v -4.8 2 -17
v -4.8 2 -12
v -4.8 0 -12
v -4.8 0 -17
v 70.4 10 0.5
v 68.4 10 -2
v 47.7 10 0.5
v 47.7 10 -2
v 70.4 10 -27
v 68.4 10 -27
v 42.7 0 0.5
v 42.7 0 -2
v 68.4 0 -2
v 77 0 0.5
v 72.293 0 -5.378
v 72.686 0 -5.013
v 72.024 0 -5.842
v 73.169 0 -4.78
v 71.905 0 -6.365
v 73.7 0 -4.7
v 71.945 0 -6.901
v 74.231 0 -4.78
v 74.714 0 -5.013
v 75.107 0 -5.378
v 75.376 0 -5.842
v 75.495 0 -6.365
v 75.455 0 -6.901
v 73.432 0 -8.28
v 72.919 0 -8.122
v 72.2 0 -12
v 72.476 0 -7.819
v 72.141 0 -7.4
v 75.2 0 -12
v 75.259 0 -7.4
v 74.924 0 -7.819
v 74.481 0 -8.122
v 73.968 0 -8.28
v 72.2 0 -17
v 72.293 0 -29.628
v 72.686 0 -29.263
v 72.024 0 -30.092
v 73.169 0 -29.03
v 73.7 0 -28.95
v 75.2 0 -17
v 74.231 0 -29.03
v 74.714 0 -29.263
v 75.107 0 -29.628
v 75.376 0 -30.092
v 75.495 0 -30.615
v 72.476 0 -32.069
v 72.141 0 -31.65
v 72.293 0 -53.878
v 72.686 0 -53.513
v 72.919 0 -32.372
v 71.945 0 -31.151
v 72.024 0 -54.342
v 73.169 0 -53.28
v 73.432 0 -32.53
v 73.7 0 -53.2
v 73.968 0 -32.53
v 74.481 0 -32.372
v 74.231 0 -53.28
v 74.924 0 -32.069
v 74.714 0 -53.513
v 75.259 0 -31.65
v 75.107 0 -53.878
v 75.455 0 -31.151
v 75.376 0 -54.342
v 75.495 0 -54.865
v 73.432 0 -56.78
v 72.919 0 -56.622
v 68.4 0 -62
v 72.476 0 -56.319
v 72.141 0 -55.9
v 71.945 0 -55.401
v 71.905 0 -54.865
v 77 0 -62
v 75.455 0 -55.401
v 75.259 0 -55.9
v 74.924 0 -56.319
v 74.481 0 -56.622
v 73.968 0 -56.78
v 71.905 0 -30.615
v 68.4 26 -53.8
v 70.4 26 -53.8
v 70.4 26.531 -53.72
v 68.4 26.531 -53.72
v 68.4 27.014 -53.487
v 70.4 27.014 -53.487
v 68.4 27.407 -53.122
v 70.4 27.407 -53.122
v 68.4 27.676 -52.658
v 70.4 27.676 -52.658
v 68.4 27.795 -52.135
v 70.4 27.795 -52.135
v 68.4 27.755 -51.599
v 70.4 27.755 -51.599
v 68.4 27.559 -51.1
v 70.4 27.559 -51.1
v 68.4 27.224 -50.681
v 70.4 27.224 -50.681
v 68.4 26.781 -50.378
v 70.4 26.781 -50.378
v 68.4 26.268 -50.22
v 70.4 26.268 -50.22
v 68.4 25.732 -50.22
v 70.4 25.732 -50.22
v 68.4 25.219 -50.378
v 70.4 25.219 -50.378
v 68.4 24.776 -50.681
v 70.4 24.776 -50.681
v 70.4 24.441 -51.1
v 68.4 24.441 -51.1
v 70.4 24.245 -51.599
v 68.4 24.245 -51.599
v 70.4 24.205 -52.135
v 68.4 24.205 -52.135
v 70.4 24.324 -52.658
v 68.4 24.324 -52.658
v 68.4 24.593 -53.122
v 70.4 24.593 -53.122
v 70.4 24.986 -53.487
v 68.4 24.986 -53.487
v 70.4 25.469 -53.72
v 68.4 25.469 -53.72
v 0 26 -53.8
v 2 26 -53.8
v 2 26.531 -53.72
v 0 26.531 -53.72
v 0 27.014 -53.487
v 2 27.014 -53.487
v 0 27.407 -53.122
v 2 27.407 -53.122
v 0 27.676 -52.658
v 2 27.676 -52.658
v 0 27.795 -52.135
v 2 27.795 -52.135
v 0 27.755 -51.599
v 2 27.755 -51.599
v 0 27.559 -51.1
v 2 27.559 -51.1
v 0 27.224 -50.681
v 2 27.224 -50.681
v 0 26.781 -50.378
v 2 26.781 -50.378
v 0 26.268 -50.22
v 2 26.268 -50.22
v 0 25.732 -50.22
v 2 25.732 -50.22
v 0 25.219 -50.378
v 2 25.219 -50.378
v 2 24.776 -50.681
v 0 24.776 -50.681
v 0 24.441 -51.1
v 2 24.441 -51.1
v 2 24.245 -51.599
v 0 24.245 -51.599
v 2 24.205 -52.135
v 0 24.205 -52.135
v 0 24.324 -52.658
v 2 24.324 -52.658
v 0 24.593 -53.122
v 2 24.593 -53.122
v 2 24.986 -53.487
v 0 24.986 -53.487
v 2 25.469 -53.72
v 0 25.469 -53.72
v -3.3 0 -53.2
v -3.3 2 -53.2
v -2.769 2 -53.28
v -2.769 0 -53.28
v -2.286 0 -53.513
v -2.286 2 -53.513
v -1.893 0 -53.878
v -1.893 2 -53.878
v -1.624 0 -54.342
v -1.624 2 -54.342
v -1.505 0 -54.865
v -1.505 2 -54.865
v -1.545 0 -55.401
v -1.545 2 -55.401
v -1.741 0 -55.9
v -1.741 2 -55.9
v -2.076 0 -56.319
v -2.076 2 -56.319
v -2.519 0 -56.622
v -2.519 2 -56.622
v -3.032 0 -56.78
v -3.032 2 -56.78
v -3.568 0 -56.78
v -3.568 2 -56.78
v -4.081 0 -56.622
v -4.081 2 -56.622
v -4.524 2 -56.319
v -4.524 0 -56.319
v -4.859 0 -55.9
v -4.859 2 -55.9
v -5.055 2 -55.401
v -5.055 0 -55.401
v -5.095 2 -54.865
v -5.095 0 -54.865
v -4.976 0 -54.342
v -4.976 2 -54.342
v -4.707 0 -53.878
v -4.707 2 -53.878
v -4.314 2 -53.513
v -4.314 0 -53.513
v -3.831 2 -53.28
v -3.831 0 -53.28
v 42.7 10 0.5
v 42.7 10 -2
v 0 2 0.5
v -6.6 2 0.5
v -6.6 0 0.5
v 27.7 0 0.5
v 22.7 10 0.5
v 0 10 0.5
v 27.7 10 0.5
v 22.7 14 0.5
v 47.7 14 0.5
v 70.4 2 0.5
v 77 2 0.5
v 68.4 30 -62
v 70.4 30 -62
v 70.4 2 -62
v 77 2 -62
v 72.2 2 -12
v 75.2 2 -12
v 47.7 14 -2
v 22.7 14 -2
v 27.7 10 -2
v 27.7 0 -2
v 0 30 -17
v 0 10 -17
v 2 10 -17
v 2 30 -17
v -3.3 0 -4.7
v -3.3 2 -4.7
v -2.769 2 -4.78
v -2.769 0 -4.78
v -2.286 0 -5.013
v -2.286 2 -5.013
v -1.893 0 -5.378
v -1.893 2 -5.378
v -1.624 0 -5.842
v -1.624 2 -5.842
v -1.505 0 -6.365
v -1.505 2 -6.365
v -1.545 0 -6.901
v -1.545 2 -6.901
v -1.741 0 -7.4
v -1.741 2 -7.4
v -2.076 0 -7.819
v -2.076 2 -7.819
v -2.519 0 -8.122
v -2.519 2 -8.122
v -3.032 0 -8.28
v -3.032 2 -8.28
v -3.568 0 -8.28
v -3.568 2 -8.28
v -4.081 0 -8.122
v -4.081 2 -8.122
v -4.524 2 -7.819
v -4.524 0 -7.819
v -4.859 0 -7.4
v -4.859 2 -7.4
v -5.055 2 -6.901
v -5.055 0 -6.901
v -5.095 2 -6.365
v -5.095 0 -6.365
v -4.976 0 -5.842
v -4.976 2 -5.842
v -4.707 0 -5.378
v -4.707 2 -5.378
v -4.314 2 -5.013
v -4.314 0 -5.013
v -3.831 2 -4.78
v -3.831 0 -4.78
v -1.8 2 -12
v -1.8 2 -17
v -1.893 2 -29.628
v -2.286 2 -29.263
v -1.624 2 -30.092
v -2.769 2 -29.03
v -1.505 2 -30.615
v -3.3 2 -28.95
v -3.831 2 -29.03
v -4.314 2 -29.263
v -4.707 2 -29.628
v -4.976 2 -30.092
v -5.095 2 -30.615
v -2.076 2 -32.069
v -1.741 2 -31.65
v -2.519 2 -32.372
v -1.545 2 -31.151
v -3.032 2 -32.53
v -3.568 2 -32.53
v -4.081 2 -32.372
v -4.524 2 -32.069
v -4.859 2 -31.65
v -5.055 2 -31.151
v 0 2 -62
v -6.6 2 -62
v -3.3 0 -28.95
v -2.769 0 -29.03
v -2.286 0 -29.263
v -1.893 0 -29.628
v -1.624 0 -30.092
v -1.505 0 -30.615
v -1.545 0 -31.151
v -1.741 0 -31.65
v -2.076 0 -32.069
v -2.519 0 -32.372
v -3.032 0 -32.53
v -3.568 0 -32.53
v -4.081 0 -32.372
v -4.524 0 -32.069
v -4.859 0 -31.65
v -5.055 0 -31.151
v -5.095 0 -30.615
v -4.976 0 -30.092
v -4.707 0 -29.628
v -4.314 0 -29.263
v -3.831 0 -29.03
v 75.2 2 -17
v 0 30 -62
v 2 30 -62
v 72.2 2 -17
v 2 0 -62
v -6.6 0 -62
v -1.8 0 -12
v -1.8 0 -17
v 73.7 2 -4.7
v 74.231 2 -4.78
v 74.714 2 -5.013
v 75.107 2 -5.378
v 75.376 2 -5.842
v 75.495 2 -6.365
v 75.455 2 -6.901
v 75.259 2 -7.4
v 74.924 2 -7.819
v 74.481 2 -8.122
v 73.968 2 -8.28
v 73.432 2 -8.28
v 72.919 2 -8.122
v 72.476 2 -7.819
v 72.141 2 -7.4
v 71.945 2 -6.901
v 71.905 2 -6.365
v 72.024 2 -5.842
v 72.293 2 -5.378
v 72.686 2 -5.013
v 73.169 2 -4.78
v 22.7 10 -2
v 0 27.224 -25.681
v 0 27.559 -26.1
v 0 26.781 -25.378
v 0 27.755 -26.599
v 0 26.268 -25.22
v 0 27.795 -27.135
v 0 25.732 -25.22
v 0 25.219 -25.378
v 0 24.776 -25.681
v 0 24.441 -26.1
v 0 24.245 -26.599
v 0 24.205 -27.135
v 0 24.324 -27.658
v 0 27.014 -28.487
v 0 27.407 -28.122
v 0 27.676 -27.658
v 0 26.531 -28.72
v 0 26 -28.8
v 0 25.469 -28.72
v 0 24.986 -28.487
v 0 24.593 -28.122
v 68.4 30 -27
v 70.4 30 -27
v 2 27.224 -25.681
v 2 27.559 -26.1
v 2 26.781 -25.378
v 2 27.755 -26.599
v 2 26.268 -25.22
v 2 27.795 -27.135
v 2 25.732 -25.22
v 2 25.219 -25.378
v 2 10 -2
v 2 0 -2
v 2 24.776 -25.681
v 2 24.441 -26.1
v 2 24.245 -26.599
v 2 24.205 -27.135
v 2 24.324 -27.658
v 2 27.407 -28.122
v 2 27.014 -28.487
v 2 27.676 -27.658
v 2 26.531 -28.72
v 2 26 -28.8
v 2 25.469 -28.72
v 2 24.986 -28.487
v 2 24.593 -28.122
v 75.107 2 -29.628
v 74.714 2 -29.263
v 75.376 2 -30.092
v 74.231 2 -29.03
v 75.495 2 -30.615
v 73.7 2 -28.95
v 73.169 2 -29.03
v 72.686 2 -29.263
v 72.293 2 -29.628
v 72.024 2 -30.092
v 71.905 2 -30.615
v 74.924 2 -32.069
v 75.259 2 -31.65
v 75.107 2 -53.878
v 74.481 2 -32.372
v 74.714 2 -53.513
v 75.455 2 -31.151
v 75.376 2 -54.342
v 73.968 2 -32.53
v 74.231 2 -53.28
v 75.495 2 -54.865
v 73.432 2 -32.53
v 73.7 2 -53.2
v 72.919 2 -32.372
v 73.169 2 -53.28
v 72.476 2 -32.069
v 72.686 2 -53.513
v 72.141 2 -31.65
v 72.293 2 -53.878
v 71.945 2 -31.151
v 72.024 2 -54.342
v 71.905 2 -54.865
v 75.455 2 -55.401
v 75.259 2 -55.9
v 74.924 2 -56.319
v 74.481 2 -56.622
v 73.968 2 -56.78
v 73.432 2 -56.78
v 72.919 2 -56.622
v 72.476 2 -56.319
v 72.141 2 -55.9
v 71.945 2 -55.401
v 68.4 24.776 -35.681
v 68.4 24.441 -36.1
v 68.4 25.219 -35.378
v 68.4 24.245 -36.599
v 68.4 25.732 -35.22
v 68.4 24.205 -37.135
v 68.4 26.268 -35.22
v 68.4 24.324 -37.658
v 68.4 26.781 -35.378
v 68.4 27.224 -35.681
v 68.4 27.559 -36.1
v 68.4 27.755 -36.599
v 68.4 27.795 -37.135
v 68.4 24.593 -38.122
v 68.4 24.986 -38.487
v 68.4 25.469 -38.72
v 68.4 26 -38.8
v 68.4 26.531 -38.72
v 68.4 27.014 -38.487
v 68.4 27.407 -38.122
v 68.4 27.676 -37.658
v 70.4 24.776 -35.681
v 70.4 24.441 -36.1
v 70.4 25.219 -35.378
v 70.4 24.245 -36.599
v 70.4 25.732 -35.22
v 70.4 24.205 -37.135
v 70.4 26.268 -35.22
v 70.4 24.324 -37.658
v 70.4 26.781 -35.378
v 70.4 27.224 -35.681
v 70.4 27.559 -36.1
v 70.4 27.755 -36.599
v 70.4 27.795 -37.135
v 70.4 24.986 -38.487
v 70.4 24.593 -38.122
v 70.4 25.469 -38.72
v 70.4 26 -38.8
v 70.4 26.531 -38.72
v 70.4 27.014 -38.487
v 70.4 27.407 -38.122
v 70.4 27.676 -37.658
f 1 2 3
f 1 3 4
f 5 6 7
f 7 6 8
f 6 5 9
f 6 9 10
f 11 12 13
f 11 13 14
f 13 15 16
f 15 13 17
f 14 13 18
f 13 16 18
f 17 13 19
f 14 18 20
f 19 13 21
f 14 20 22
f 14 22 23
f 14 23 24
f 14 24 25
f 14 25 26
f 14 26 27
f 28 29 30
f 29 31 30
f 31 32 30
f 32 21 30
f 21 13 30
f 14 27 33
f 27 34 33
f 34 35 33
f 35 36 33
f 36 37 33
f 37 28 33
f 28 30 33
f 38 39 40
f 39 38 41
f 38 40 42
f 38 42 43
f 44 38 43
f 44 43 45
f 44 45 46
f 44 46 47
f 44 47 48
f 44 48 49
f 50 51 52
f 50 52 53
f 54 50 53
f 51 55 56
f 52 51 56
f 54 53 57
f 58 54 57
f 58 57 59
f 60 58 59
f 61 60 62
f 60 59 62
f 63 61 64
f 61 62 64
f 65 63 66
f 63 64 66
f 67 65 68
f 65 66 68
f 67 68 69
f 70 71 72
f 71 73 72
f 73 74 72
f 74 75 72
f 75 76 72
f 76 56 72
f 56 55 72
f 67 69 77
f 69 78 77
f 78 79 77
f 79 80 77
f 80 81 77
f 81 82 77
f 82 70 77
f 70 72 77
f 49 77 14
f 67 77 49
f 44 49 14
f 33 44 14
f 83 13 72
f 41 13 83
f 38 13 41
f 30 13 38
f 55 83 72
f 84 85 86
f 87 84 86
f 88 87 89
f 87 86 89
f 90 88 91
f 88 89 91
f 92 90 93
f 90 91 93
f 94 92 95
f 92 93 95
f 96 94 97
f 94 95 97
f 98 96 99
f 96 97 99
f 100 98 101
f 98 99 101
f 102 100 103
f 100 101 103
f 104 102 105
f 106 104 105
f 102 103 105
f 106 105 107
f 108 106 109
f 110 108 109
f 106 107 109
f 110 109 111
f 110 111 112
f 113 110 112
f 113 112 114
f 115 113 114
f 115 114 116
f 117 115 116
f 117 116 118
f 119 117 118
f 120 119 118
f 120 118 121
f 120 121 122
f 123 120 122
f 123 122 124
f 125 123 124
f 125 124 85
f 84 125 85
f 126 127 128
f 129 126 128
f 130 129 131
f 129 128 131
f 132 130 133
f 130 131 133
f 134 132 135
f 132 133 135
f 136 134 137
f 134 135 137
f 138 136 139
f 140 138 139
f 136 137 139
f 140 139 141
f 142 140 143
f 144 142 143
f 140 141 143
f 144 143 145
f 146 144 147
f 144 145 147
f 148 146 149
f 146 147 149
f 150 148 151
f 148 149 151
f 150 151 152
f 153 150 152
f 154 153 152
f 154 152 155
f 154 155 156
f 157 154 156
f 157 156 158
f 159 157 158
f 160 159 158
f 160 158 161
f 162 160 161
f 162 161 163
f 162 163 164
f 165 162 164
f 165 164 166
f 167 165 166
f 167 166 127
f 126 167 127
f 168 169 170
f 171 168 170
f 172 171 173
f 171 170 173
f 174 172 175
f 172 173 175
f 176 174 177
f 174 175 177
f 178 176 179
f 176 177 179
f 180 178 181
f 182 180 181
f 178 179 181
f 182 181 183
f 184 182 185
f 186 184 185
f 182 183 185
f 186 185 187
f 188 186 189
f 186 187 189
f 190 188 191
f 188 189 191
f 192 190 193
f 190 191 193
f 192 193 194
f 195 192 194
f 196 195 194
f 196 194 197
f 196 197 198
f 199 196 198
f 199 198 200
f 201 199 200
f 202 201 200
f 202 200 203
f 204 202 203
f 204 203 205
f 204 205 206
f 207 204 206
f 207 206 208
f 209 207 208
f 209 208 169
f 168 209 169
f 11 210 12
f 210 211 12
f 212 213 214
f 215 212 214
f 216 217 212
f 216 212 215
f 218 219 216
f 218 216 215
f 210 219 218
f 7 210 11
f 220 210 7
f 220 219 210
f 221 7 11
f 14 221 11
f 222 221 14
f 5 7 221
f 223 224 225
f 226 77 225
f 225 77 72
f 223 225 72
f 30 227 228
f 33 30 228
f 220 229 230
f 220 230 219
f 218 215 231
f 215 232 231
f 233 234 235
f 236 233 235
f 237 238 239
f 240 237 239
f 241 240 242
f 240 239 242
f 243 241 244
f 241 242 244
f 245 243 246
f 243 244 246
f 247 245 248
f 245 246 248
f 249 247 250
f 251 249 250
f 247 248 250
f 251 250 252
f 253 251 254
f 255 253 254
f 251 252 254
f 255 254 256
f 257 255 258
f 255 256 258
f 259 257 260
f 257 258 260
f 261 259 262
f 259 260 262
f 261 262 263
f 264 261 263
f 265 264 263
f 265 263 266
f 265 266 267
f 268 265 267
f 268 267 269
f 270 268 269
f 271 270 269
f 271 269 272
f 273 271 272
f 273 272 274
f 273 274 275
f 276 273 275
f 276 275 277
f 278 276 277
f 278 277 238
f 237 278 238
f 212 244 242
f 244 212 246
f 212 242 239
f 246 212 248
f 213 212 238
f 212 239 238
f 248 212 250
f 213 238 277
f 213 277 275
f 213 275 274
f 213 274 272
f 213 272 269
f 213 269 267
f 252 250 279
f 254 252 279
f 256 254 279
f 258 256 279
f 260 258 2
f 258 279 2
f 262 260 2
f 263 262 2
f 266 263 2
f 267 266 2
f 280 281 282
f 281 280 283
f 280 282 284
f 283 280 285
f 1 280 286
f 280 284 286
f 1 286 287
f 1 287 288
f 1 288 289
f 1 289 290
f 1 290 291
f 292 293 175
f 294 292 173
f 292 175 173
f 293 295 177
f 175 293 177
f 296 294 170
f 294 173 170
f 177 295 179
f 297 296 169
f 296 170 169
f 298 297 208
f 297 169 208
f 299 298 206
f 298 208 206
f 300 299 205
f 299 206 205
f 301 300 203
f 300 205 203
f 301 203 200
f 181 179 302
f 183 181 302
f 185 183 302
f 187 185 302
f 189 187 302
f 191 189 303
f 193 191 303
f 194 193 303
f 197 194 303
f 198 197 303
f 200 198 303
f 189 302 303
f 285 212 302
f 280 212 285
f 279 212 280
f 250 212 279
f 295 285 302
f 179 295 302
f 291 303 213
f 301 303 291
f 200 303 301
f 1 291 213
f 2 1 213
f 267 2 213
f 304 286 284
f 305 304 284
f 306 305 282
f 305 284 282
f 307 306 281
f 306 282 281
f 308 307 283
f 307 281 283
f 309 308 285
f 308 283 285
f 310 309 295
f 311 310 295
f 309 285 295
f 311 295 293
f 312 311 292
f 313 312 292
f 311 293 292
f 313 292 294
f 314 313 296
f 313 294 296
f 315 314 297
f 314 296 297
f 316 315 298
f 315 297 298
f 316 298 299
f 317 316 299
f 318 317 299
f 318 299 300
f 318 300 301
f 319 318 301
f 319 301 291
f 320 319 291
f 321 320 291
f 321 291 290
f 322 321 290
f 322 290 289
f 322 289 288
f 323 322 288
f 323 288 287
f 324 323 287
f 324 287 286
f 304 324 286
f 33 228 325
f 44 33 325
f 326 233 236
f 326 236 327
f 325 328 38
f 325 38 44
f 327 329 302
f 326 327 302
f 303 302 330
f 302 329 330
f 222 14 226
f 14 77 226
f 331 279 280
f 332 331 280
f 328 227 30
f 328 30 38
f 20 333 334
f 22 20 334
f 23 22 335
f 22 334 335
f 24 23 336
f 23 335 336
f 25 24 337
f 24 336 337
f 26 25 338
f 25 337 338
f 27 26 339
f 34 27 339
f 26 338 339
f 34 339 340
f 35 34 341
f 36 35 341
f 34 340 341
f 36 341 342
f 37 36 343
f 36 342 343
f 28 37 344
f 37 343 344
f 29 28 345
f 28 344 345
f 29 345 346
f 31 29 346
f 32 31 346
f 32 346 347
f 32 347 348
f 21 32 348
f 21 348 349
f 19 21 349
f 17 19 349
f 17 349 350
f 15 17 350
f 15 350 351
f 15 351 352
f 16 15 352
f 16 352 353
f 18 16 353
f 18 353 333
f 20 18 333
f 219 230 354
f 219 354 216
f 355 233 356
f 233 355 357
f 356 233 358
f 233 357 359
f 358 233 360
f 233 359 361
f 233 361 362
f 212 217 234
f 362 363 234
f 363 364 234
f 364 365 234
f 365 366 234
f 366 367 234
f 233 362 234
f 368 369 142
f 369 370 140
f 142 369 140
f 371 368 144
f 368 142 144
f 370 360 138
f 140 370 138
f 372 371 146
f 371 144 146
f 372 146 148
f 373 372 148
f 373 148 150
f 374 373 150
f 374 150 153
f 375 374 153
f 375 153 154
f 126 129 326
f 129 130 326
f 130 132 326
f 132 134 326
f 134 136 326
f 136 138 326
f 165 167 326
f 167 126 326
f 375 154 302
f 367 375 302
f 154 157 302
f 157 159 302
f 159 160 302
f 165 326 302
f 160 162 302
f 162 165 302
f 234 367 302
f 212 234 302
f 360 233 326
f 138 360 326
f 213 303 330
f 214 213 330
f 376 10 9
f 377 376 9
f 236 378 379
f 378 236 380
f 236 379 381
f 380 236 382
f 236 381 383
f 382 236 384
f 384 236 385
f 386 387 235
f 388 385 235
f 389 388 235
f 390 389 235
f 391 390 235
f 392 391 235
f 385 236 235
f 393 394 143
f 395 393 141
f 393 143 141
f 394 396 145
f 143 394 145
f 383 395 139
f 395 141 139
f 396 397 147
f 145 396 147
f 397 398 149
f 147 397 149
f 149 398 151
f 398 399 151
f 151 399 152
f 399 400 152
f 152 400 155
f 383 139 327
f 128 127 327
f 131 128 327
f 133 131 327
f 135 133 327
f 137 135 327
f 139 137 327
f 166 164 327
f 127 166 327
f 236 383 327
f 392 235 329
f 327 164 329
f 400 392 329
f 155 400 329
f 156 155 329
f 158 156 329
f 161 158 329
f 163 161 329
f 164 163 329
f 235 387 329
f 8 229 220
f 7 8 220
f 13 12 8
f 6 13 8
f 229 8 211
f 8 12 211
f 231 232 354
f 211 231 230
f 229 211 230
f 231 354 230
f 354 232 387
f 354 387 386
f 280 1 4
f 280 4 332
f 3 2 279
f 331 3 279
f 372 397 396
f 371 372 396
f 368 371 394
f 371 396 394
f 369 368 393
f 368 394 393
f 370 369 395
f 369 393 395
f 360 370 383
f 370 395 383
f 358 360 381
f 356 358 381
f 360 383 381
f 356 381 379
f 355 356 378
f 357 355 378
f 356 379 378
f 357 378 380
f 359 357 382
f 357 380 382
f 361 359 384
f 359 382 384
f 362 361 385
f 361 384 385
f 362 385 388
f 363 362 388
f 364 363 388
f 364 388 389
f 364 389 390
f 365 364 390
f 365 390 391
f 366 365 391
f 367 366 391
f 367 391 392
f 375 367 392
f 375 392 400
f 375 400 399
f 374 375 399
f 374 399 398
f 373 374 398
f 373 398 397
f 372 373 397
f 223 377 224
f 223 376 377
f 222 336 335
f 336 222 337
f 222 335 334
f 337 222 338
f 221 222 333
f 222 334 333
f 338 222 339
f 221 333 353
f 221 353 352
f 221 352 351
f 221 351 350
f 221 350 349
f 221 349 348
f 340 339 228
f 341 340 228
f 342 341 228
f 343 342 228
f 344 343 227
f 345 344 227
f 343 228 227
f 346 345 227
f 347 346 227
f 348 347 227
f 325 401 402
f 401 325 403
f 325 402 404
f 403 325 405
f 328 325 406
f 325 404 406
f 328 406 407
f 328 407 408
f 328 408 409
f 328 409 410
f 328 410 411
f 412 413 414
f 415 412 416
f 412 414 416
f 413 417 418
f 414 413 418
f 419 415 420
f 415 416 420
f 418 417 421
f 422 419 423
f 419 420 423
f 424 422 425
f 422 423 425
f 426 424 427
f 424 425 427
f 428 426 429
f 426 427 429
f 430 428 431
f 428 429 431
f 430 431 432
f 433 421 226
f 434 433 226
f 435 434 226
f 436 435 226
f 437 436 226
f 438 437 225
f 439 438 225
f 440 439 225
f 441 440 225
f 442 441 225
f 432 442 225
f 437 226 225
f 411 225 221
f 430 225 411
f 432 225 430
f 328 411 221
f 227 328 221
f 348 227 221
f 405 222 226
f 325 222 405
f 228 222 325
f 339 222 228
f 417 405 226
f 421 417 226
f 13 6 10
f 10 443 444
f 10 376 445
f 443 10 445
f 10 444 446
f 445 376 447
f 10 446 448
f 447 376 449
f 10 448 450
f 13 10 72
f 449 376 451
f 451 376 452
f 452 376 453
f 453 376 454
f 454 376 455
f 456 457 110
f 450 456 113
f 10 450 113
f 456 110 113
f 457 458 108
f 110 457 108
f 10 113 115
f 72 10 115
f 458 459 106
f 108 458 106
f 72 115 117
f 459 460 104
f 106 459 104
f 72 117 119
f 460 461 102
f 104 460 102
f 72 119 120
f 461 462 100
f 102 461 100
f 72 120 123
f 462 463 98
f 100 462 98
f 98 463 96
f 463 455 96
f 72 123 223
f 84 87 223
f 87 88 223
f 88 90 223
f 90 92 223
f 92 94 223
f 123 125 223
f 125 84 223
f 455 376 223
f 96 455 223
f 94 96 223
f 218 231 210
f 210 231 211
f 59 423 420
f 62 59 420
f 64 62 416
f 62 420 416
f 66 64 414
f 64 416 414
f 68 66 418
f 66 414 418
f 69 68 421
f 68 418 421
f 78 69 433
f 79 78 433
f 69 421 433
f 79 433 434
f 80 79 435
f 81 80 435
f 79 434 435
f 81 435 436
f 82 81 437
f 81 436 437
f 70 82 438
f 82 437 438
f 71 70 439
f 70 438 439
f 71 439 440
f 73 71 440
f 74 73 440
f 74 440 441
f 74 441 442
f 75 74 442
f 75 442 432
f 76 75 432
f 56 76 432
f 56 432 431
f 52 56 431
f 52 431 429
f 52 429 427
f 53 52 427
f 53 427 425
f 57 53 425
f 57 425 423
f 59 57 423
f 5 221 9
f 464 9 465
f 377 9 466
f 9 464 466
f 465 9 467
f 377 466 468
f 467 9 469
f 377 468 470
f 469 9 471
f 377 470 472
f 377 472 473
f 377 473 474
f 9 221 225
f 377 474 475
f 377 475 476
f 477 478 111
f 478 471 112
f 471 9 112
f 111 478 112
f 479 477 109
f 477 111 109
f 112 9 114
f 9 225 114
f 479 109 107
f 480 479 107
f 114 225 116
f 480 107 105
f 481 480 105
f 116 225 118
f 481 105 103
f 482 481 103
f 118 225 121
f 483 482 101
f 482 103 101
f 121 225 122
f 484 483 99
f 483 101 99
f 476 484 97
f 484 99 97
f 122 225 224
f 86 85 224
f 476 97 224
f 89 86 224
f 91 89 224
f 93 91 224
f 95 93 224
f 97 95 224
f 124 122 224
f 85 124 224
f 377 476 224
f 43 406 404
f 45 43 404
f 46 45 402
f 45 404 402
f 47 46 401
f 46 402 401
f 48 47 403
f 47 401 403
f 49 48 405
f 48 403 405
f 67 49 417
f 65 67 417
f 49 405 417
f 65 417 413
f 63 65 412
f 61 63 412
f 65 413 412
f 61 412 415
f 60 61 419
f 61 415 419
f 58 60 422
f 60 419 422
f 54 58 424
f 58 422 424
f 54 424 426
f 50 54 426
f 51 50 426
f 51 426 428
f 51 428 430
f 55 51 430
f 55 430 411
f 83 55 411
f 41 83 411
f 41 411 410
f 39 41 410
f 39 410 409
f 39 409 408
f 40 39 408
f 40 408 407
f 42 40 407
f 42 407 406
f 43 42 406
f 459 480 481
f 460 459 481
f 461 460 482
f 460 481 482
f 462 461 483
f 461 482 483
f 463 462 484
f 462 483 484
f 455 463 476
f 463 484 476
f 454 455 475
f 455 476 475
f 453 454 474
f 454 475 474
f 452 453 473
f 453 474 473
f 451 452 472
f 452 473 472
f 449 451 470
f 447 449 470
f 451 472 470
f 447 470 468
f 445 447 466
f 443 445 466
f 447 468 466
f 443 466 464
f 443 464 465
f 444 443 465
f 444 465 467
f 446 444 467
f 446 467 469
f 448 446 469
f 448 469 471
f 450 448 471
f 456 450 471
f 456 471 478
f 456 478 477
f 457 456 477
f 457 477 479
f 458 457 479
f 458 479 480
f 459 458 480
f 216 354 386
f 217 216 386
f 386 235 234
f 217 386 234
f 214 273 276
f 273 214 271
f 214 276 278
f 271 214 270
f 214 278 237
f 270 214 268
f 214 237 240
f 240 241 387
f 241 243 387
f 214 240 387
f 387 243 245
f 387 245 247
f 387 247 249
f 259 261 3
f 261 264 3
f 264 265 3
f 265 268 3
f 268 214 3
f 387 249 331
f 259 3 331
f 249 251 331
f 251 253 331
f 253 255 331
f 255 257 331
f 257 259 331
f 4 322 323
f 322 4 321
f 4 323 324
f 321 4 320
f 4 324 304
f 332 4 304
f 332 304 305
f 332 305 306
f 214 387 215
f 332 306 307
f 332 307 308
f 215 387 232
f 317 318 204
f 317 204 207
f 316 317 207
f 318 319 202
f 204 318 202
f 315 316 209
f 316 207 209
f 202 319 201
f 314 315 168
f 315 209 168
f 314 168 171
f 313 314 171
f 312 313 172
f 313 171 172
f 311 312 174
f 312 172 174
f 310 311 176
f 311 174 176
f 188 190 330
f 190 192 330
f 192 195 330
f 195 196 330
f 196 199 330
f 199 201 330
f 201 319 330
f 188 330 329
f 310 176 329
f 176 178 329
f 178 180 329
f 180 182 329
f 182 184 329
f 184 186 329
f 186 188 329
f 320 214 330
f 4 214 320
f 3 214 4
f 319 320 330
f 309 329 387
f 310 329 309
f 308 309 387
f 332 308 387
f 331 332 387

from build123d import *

# Parameters (mm, degrees)
SKETCH1_W                 = 70.4
SKETCH1_H                 = 2
BOSS_EXTRUDE2_DEPTH       = 10
SKETCH2_W                 = 2
SKETCH2_H                 = 55
BOSS_EXTRUDE3_DEPTH       = 10
SKETCH3_W                 = 19
SKETCH3_H                 = 3
BOSS_EXTRUDE4_DEPTH       = 2
SKETCH4_W                 = 15
SKETCH4_H                 = 10
CUT_EXTRUDE2_DEPTH        = 2
SKETCH5_W                 = 2
SKETCH5_H                 = 3
BOSS_EXTRUDE5_DEPTH       = 1
SKETCH6_W                 = 2
SKETCH6_H                 = 3
BOSS_EXTRUDE6_DEPTH       = 1
SKETCH7_W                 = 57
SKETCH7_H                 = 2
BOSS_EXTRUDE7_DEPTH       = 6.6
SKETCH8_W                 = 57
SKETCH8_H                 = 2
BOSS_EXTRUDE8_DEPTH       = 6.6
BOSS_EXTRUDE9_DEPTH       = 5
SKETCH12_W                = 2
SKETCH12_H                = 5
SKETCH12_H_2              = 40
SKETCH12_H_3              = 30
BOSS_EXTRUDE10_DEPTH      = 20
BOSS_EXTRUDE11_DEPTH      = 3
SKETCH14_W                = 0.5
SKETCH14_H                = 9
CUT_EXTRUDE3_DEPTH        = 3
SKETCH15_W                = 38.4
SKETCH15_H                = 45
CUT_EXTRUDE4_DEPTH        = 3
BOSS_EXTRUDE12_DEPTH      = 0.5
SKETCH17_R                = 1.8
SKETCH17_W                = 3
SKETCH17_H                = 5
CUT_EXTRUDE6_DEPTH        = 3
CUT_EXTRUDE7_DEPTH        = 116
CUT_EXTRUDE7_DEPTH_BACK   = 44
SKETCH18_W                = 45
SKETCH18_H                = 3
SKETCH19_R                = 1.8
CUT_EXTRUDE8_DEPTH        = 10
SKETCH20_R                = 1.8
CUT_EXTRUDE9_DEPTH        = 10
BOSS_EXTRUDE15_DEPTH      = 2
BOSS_EXTRUDE15_DEPTH_BACK = 23
SKETCH25_W                = 2.5
SKETCH25_H                = 4


with BuildPart() as part:
    # Sketch1 → Boss-Extrude2 (new body)
    with BuildSketch(Plane(origin=(0, 0, 0), x_dir=(1, 0, 0), z_dir=(0, 1, 0))):
        with Locations((35.2, 1)):
            Rectangle(SKETCH1_W, SKETCH1_H)
    extrude(amount=BOSS_EXTRUDE2_DEPTH)

    # Sketch2 → Boss-Extrude3 (add)
    with BuildSketch(Plane(origin=(0, 10, 0), x_dir=(1, 0, 0), z_dir=(0, 1, 0))):
        with Locations((1, 29.5)):
            Rectangle(SKETCH2_W, SKETCH2_H)
        with Locations((69.4, 29.5)):
            Rectangle(SKETCH2_W, SKETCH2_H)
    extrude(amount=-BOSS_EXTRUDE3_DEPTH)

    # Sketch3 → Boss-Extrude4 (add)
    with BuildSketch(Plane.XY):
        with Locations((35.2, 11.5)):
            Rectangle(SKETCH3_W, SKETCH3_H)
    extrude(amount=-BOSS_EXTRUDE4_DEPTH)

    # Sketch4 → Cut-Extrude2 (cut)
    with BuildSketch(Plane.XY):
        with Locations((35.2, 5)):
            Rectangle(SKETCH4_W, SKETCH4_H)
    extrude(amount=-CUT_EXTRUDE2_DEPTH, mode=Mode.SUBTRACT)

    # Sketch5 → Boss-Extrude5 (add)
    with BuildSketch(Plane.ZY.offset(-25.7)):
        with Locations((-1, 11.5)):
            Rectangle(SKETCH5_W, SKETCH5_H)
    extrude(amount=BOSS_EXTRUDE5_DEPTH)

    # Sketch6 → Boss-Extrude6 (add)
    with BuildSketch(Plane(origin=(44.7, 0, 0), x_dir=(0, 0, -1), z_dir=(1, 0, 0))):
        with Locations((1, 11.5)):
            Rectangle(SKETCH6_W, SKETCH6_H)
    extrude(amount=BOSS_EXTRUDE6_DEPTH)

    # Sketch7 → Boss-Extrude7 (add)
    with BuildSketch(Plane.ZY):
        with Locations((-28.5, 1)):
            Rectangle(SKETCH7_W, SKETCH7_H)
    extrude(amount=BOSS_EXTRUDE7_DEPTH)

    # Sketch8 → Boss-Extrude8 (add)
    with BuildSketch(Plane(origin=(70.4, 0, 0), x_dir=(0, 0, -1), z_dir=(1, 0, 0))):
        with Locations((28.5, 1)):
            Rectangle(SKETCH8_W, SKETCH8_H)
    extrude(amount=BOSS_EXTRUDE8_DEPTH)

    # Sketch10 → Boss-Extrude9 (add)
    with BuildSketch(Plane(origin=(0, 0, -57), x_dir=(-1, 0, 0), z_dir=(0, 0, -1))):
        Polygon((-2, 10), (-2, 0), (6.6, 0), (6.6, 2), (0, 2), (0, 10), align=None)
        Polygon((-77, 0), (-68.4, 0), (-68.4, 10), (-70.4, 10), (-70.4, 2), (-77, 2), align=None)
    extrude(amount=BOSS_EXTRUDE9_DEPTH)

    # Sketch12 → Boss-Extrude10 (add)
    with BuildSketch(Plane(origin=(0, 10, 0), x_dir=(1, 0, 0), z_dir=(0, 1, 0))):
        with Locations((1, 59.5)):
            Rectangle(SKETCH12_W, SKETCH12_H)
        with Locations((1, 37)):
            Rectangle(SKETCH12_W, SKETCH12_H_2)
        with Locations((69.4, 42)):
            Rectangle(SKETCH12_W, SKETCH12_H_3)
        with Locations((69.4, 59.5)):
            Rectangle(SKETCH12_W, SKETCH12_H)
    extrude(amount=BOSS_EXTRUDE10_DEPTH)

    # Sketch13 → Boss-Extrude11 (add)
    with BuildSketch(Plane(origin=(0, 30, 0), x_dir=(1, 0, 0), z_dir=(0, 1, 0))):
        Polygon((0, 17), (35.2, 17), (35.2, 27), (70.4, 27), (70.4, 62), (0, 62), align=None)
    extrude(amount=BOSS_EXTRUDE11_DEPTH)

    # Sketch14 → Cut-Extrude3 (cut)
    with BuildSketch(Plane(origin=(0, 33, 0), x_dir=(1, 0, 0), z_dir=(0, 1, 0))):
        with Locations((11.7, 51)):
            Rectangle(SKETCH14_W, SKETCH14_H)
        with Locations((11.7, 38)):
            Rectangle(SKETCH14_W, SKETCH14_H)
        with Locations((11.7, 25.5)):
            Rectangle(SKETCH14_W, SKETCH14_H)
        with Locations((58.2, 51)):
            Rectangle(SKETCH14_W, SKETCH14_H)
        with Locations((58.2, 38)):
            Rectangle(SKETCH14_W, SKETCH14_H)
    extrude(amount=-CUT_EXTRUDE3_DEPTH, mode=Mode.SUBTRACT)

    # Sketch15 → Cut-Extrude4 (cut)
    with BuildSketch(Plane(origin=(0, 33, 0), x_dir=(1, 0, 0), z_dir=(0, 1, 0))):
        with Locations((35.2, 39.5)):
            Rectangle(SKETCH15_W, SKETCH15_H)
    extrude(amount=-CUT_EXTRUDE4_DEPTH, mode=Mode.SUBTRACT)

    # Sketch16 → Boss-Extrude12 (add)
    with BuildSketch(Plane.XY):
        Polygon((-6.6, 0), (27.7, 0), (27.7, 10), (42.7, 10), (42.7, 0), (77, 0), (77, 2), (70.4, 2), (70.4, 10), (45.7, 10), (45.7, 13), (24.7, 13), (24.7, 10), (0, 10), (0, 2), (-6.6, 2), align=None)
    extrude(amount=BOSS_EXTRUDE12_DEPTH)

    # Sketch17 → Cut-Extrude6 (cut)
    with BuildSketch(Plane(origin=(0, 2, 0), x_dir=(1, 0, 0), z_dir=(0, 1, 0))):
        with Locations(Location((-3.3, 55, 0), (0, 0, 270))):
            Circle(SKETCH17_R)
        with Locations(Location((73.7, 55, 0), (0, 0, 270))):
            Circle(SKETCH17_R)
        with Locations(Location((-3.3, 6.5, 0), (0, 0, 270))):
            Circle(SKETCH17_R)
        with Locations(Location((73.7, 6.5, 0), (0, 0, 270))):
            Circle(SKETCH17_R)
        with Locations(Location((-3.3, 30.75, 0), (0, 0, 270))):
            Circle(SKETCH17_R)
        with Locations(Location((73.7, 30.75, 0), (0, 0, 270))):
            Circle(SKETCH17_R)
        with Locations((-3.3, 14.5)):
            Rectangle(SKETCH17_W, SKETCH17_H)
        with Locations((73.7, 14.5)):
            Rectangle(SKETCH17_W, SKETCH17_H)
    extrude(amount=-CUT_EXTRUDE6_DEPTH, mode=Mode.SUBTRACT)

    # Sketch18 → Cut-Extrude7 (cut, two sides: drawn at the far end of the back side and taken through both)
    with BuildSketch(Plane(origin=(16, 0, 0), x_dir=(0, 0, -1), z_dir=(1, 0, 0)).offset(-CUT_EXTRUDE7_DEPTH_BACK)):
        with Locations((39.5, 31.5)):
            Rectangle(SKETCH18_W, SKETCH18_H)
    extrude(amount=CUT_EXTRUDE7_DEPTH + CUT_EXTRUDE7_DEPTH_BACK, mode=Mode.SUBTRACT)

    # Sketch19 → Cut-Extrude8 (cut)
    with BuildSketch(Plane(origin=(2, 0, 0), x_dir=(0, 0, -1), z_dir=(1, 0, 0))):
        with Locations((52, 26)):
            Circle(SKETCH19_R)
        with Locations((27, 26)):
            Circle(SKETCH19_R)
    extrude(amount=-CUT_EXTRUDE8_DEPTH, mode=Mode.SUBTRACT)

    # Sketch20 → Cut-Extrude9 (cut)
    with BuildSketch(Plane(origin=(70.4, 0, 0), x_dir=(0, 0, -1), z_dir=(1, 0, 0))):
        with Locations((52, 26)):
            Circle(SKETCH20_R)
        with Locations((37, 26)):
            Circle(SKETCH20_R)
    extrude(amount=-CUT_EXTRUDE9_DEPTH, mode=Mode.SUBTRACT)

    # Sketch25 → Boss-Extrude15 (add, two sides: drawn at the far end of the back side and taken through both)
    with BuildSketch(Plane.ZY.offset(-24.7).offset(-BOSS_EXTRUDE15_DEPTH_BACK)):
        with Locations((-0.75, 12)):
            Rectangle(SKETCH25_W, SKETCH25_H)
    extrude(amount=BOSS_EXTRUDE15_DEPTH + BOSS_EXTRUDE15_DEPTH_BACK)


solid = part.part
